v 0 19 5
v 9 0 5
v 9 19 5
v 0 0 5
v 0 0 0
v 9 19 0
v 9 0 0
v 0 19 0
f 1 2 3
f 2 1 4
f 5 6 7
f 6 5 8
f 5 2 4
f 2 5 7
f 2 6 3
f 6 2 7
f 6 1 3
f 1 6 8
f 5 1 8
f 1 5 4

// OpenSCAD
// Generated by SolidPython 1.0.1 on 2020-07-29 00:46:55


cube(size = [9, 19, 5]);
/***********************************************
*********      SolidPython code:      **********
************************************************
 
# import packages: SolidPython
from solid import *
from solid.utils import *
from itertools import chain, combinations, permutations


class Resize:

    def __init__(self, scad_file):
        self.scad_file = scad_file
        #self.scad_file = import_scad(scad_file)
        # cone/cylinder param:
        self.r1 = 0
        self.r2 = 0
        self.h = 0
        # rectangular prism param:
        self.w = 0
        self.l = 0
        # ellipse param:
        self.r = 0

    # import OpenScad code (file name corresponds to shape)


    # classify shape + parameters
    def assign(self, param1, param2, param3):
        if self.scad_file == 'cone.scad':
            self.r1 = param1
            self.r2 = param2
            self.h = param3
        elif self.scad_file == 'cylinder.scad':
            self.r1 = param1
            self.r2 = param2
            self.h = param3
        elif self.scad_file == 'rectangularPrism.scad':
            self.h = param1
            self.l = param2
            self.w = param3
        else:
            self.r = param1
            self.h = param2

    # resize parameters
    def iterate(self):
        x = range(3, 20, 2)
        i = 1
        if self.scad_file == 'cone.scad':
            tempList = list(permutations(x, 2))
            for temp in tempList:
                param1 = temp[0]
                param2 = temp[1]
                filepath = 'produced_scad_files/' + 'cone' + str(param1) + '_' + str(param2) + '_' + '.scad'
                scad_render_to_file(cylinder(h=param1, r1=param2, r2=0), filepath)

        elif self.scad_file == 'cylinder.scad':
            tempList = list(permutations(x, 3))
            for temp in tempList:
                param1 = temp[0]
                param2 = temp[1]
                filepath = 'produced_scad_files/' + 'cylinder' + str(param1) + '_' + str(param2) + '_' + '.scad'
                scad_render_to_file(cylinder(h=param1, r1=param2, r2=param2), filepath)

        elif self.scad_file == 'rectangularPrism.scad':
            tempList = list(permutations(x, 3))
            for temp in tempList:
                param1 = temp[0]
                param2 = temp[1]
                param3 = temp[2]
                filepath = 'produced_scad_files/' + 'rectangularPrism' + str(param1) + '_' + str(param2) + '_' + str(
                    param3) + '.scad'
                scad_render_to_file(cube(size=(param1, param2, param3)), filepath)

        elif self.scad_file == 'ellipse.scad':
            tempList = list(permutations(x, 4))
            for temp in tempList:
                param1 = temp[0]
                param2 = temp[1]
                param3 = temp[2]
                param4 = temp[3]
                filepath = 'produced_scad_files/' + 'ellipse' + str(param1) + '_' + str(param2) + '_' + str(param3) + '_' + str(param4) + '.scad'
                scad_render_to_file(scale([param1, param2, param3])(sphere(r=param4)), filepath)

    def render_to_scadfile(self):
        scad_render_to_file(scad, 'example.scad') 
 
************************************************/
